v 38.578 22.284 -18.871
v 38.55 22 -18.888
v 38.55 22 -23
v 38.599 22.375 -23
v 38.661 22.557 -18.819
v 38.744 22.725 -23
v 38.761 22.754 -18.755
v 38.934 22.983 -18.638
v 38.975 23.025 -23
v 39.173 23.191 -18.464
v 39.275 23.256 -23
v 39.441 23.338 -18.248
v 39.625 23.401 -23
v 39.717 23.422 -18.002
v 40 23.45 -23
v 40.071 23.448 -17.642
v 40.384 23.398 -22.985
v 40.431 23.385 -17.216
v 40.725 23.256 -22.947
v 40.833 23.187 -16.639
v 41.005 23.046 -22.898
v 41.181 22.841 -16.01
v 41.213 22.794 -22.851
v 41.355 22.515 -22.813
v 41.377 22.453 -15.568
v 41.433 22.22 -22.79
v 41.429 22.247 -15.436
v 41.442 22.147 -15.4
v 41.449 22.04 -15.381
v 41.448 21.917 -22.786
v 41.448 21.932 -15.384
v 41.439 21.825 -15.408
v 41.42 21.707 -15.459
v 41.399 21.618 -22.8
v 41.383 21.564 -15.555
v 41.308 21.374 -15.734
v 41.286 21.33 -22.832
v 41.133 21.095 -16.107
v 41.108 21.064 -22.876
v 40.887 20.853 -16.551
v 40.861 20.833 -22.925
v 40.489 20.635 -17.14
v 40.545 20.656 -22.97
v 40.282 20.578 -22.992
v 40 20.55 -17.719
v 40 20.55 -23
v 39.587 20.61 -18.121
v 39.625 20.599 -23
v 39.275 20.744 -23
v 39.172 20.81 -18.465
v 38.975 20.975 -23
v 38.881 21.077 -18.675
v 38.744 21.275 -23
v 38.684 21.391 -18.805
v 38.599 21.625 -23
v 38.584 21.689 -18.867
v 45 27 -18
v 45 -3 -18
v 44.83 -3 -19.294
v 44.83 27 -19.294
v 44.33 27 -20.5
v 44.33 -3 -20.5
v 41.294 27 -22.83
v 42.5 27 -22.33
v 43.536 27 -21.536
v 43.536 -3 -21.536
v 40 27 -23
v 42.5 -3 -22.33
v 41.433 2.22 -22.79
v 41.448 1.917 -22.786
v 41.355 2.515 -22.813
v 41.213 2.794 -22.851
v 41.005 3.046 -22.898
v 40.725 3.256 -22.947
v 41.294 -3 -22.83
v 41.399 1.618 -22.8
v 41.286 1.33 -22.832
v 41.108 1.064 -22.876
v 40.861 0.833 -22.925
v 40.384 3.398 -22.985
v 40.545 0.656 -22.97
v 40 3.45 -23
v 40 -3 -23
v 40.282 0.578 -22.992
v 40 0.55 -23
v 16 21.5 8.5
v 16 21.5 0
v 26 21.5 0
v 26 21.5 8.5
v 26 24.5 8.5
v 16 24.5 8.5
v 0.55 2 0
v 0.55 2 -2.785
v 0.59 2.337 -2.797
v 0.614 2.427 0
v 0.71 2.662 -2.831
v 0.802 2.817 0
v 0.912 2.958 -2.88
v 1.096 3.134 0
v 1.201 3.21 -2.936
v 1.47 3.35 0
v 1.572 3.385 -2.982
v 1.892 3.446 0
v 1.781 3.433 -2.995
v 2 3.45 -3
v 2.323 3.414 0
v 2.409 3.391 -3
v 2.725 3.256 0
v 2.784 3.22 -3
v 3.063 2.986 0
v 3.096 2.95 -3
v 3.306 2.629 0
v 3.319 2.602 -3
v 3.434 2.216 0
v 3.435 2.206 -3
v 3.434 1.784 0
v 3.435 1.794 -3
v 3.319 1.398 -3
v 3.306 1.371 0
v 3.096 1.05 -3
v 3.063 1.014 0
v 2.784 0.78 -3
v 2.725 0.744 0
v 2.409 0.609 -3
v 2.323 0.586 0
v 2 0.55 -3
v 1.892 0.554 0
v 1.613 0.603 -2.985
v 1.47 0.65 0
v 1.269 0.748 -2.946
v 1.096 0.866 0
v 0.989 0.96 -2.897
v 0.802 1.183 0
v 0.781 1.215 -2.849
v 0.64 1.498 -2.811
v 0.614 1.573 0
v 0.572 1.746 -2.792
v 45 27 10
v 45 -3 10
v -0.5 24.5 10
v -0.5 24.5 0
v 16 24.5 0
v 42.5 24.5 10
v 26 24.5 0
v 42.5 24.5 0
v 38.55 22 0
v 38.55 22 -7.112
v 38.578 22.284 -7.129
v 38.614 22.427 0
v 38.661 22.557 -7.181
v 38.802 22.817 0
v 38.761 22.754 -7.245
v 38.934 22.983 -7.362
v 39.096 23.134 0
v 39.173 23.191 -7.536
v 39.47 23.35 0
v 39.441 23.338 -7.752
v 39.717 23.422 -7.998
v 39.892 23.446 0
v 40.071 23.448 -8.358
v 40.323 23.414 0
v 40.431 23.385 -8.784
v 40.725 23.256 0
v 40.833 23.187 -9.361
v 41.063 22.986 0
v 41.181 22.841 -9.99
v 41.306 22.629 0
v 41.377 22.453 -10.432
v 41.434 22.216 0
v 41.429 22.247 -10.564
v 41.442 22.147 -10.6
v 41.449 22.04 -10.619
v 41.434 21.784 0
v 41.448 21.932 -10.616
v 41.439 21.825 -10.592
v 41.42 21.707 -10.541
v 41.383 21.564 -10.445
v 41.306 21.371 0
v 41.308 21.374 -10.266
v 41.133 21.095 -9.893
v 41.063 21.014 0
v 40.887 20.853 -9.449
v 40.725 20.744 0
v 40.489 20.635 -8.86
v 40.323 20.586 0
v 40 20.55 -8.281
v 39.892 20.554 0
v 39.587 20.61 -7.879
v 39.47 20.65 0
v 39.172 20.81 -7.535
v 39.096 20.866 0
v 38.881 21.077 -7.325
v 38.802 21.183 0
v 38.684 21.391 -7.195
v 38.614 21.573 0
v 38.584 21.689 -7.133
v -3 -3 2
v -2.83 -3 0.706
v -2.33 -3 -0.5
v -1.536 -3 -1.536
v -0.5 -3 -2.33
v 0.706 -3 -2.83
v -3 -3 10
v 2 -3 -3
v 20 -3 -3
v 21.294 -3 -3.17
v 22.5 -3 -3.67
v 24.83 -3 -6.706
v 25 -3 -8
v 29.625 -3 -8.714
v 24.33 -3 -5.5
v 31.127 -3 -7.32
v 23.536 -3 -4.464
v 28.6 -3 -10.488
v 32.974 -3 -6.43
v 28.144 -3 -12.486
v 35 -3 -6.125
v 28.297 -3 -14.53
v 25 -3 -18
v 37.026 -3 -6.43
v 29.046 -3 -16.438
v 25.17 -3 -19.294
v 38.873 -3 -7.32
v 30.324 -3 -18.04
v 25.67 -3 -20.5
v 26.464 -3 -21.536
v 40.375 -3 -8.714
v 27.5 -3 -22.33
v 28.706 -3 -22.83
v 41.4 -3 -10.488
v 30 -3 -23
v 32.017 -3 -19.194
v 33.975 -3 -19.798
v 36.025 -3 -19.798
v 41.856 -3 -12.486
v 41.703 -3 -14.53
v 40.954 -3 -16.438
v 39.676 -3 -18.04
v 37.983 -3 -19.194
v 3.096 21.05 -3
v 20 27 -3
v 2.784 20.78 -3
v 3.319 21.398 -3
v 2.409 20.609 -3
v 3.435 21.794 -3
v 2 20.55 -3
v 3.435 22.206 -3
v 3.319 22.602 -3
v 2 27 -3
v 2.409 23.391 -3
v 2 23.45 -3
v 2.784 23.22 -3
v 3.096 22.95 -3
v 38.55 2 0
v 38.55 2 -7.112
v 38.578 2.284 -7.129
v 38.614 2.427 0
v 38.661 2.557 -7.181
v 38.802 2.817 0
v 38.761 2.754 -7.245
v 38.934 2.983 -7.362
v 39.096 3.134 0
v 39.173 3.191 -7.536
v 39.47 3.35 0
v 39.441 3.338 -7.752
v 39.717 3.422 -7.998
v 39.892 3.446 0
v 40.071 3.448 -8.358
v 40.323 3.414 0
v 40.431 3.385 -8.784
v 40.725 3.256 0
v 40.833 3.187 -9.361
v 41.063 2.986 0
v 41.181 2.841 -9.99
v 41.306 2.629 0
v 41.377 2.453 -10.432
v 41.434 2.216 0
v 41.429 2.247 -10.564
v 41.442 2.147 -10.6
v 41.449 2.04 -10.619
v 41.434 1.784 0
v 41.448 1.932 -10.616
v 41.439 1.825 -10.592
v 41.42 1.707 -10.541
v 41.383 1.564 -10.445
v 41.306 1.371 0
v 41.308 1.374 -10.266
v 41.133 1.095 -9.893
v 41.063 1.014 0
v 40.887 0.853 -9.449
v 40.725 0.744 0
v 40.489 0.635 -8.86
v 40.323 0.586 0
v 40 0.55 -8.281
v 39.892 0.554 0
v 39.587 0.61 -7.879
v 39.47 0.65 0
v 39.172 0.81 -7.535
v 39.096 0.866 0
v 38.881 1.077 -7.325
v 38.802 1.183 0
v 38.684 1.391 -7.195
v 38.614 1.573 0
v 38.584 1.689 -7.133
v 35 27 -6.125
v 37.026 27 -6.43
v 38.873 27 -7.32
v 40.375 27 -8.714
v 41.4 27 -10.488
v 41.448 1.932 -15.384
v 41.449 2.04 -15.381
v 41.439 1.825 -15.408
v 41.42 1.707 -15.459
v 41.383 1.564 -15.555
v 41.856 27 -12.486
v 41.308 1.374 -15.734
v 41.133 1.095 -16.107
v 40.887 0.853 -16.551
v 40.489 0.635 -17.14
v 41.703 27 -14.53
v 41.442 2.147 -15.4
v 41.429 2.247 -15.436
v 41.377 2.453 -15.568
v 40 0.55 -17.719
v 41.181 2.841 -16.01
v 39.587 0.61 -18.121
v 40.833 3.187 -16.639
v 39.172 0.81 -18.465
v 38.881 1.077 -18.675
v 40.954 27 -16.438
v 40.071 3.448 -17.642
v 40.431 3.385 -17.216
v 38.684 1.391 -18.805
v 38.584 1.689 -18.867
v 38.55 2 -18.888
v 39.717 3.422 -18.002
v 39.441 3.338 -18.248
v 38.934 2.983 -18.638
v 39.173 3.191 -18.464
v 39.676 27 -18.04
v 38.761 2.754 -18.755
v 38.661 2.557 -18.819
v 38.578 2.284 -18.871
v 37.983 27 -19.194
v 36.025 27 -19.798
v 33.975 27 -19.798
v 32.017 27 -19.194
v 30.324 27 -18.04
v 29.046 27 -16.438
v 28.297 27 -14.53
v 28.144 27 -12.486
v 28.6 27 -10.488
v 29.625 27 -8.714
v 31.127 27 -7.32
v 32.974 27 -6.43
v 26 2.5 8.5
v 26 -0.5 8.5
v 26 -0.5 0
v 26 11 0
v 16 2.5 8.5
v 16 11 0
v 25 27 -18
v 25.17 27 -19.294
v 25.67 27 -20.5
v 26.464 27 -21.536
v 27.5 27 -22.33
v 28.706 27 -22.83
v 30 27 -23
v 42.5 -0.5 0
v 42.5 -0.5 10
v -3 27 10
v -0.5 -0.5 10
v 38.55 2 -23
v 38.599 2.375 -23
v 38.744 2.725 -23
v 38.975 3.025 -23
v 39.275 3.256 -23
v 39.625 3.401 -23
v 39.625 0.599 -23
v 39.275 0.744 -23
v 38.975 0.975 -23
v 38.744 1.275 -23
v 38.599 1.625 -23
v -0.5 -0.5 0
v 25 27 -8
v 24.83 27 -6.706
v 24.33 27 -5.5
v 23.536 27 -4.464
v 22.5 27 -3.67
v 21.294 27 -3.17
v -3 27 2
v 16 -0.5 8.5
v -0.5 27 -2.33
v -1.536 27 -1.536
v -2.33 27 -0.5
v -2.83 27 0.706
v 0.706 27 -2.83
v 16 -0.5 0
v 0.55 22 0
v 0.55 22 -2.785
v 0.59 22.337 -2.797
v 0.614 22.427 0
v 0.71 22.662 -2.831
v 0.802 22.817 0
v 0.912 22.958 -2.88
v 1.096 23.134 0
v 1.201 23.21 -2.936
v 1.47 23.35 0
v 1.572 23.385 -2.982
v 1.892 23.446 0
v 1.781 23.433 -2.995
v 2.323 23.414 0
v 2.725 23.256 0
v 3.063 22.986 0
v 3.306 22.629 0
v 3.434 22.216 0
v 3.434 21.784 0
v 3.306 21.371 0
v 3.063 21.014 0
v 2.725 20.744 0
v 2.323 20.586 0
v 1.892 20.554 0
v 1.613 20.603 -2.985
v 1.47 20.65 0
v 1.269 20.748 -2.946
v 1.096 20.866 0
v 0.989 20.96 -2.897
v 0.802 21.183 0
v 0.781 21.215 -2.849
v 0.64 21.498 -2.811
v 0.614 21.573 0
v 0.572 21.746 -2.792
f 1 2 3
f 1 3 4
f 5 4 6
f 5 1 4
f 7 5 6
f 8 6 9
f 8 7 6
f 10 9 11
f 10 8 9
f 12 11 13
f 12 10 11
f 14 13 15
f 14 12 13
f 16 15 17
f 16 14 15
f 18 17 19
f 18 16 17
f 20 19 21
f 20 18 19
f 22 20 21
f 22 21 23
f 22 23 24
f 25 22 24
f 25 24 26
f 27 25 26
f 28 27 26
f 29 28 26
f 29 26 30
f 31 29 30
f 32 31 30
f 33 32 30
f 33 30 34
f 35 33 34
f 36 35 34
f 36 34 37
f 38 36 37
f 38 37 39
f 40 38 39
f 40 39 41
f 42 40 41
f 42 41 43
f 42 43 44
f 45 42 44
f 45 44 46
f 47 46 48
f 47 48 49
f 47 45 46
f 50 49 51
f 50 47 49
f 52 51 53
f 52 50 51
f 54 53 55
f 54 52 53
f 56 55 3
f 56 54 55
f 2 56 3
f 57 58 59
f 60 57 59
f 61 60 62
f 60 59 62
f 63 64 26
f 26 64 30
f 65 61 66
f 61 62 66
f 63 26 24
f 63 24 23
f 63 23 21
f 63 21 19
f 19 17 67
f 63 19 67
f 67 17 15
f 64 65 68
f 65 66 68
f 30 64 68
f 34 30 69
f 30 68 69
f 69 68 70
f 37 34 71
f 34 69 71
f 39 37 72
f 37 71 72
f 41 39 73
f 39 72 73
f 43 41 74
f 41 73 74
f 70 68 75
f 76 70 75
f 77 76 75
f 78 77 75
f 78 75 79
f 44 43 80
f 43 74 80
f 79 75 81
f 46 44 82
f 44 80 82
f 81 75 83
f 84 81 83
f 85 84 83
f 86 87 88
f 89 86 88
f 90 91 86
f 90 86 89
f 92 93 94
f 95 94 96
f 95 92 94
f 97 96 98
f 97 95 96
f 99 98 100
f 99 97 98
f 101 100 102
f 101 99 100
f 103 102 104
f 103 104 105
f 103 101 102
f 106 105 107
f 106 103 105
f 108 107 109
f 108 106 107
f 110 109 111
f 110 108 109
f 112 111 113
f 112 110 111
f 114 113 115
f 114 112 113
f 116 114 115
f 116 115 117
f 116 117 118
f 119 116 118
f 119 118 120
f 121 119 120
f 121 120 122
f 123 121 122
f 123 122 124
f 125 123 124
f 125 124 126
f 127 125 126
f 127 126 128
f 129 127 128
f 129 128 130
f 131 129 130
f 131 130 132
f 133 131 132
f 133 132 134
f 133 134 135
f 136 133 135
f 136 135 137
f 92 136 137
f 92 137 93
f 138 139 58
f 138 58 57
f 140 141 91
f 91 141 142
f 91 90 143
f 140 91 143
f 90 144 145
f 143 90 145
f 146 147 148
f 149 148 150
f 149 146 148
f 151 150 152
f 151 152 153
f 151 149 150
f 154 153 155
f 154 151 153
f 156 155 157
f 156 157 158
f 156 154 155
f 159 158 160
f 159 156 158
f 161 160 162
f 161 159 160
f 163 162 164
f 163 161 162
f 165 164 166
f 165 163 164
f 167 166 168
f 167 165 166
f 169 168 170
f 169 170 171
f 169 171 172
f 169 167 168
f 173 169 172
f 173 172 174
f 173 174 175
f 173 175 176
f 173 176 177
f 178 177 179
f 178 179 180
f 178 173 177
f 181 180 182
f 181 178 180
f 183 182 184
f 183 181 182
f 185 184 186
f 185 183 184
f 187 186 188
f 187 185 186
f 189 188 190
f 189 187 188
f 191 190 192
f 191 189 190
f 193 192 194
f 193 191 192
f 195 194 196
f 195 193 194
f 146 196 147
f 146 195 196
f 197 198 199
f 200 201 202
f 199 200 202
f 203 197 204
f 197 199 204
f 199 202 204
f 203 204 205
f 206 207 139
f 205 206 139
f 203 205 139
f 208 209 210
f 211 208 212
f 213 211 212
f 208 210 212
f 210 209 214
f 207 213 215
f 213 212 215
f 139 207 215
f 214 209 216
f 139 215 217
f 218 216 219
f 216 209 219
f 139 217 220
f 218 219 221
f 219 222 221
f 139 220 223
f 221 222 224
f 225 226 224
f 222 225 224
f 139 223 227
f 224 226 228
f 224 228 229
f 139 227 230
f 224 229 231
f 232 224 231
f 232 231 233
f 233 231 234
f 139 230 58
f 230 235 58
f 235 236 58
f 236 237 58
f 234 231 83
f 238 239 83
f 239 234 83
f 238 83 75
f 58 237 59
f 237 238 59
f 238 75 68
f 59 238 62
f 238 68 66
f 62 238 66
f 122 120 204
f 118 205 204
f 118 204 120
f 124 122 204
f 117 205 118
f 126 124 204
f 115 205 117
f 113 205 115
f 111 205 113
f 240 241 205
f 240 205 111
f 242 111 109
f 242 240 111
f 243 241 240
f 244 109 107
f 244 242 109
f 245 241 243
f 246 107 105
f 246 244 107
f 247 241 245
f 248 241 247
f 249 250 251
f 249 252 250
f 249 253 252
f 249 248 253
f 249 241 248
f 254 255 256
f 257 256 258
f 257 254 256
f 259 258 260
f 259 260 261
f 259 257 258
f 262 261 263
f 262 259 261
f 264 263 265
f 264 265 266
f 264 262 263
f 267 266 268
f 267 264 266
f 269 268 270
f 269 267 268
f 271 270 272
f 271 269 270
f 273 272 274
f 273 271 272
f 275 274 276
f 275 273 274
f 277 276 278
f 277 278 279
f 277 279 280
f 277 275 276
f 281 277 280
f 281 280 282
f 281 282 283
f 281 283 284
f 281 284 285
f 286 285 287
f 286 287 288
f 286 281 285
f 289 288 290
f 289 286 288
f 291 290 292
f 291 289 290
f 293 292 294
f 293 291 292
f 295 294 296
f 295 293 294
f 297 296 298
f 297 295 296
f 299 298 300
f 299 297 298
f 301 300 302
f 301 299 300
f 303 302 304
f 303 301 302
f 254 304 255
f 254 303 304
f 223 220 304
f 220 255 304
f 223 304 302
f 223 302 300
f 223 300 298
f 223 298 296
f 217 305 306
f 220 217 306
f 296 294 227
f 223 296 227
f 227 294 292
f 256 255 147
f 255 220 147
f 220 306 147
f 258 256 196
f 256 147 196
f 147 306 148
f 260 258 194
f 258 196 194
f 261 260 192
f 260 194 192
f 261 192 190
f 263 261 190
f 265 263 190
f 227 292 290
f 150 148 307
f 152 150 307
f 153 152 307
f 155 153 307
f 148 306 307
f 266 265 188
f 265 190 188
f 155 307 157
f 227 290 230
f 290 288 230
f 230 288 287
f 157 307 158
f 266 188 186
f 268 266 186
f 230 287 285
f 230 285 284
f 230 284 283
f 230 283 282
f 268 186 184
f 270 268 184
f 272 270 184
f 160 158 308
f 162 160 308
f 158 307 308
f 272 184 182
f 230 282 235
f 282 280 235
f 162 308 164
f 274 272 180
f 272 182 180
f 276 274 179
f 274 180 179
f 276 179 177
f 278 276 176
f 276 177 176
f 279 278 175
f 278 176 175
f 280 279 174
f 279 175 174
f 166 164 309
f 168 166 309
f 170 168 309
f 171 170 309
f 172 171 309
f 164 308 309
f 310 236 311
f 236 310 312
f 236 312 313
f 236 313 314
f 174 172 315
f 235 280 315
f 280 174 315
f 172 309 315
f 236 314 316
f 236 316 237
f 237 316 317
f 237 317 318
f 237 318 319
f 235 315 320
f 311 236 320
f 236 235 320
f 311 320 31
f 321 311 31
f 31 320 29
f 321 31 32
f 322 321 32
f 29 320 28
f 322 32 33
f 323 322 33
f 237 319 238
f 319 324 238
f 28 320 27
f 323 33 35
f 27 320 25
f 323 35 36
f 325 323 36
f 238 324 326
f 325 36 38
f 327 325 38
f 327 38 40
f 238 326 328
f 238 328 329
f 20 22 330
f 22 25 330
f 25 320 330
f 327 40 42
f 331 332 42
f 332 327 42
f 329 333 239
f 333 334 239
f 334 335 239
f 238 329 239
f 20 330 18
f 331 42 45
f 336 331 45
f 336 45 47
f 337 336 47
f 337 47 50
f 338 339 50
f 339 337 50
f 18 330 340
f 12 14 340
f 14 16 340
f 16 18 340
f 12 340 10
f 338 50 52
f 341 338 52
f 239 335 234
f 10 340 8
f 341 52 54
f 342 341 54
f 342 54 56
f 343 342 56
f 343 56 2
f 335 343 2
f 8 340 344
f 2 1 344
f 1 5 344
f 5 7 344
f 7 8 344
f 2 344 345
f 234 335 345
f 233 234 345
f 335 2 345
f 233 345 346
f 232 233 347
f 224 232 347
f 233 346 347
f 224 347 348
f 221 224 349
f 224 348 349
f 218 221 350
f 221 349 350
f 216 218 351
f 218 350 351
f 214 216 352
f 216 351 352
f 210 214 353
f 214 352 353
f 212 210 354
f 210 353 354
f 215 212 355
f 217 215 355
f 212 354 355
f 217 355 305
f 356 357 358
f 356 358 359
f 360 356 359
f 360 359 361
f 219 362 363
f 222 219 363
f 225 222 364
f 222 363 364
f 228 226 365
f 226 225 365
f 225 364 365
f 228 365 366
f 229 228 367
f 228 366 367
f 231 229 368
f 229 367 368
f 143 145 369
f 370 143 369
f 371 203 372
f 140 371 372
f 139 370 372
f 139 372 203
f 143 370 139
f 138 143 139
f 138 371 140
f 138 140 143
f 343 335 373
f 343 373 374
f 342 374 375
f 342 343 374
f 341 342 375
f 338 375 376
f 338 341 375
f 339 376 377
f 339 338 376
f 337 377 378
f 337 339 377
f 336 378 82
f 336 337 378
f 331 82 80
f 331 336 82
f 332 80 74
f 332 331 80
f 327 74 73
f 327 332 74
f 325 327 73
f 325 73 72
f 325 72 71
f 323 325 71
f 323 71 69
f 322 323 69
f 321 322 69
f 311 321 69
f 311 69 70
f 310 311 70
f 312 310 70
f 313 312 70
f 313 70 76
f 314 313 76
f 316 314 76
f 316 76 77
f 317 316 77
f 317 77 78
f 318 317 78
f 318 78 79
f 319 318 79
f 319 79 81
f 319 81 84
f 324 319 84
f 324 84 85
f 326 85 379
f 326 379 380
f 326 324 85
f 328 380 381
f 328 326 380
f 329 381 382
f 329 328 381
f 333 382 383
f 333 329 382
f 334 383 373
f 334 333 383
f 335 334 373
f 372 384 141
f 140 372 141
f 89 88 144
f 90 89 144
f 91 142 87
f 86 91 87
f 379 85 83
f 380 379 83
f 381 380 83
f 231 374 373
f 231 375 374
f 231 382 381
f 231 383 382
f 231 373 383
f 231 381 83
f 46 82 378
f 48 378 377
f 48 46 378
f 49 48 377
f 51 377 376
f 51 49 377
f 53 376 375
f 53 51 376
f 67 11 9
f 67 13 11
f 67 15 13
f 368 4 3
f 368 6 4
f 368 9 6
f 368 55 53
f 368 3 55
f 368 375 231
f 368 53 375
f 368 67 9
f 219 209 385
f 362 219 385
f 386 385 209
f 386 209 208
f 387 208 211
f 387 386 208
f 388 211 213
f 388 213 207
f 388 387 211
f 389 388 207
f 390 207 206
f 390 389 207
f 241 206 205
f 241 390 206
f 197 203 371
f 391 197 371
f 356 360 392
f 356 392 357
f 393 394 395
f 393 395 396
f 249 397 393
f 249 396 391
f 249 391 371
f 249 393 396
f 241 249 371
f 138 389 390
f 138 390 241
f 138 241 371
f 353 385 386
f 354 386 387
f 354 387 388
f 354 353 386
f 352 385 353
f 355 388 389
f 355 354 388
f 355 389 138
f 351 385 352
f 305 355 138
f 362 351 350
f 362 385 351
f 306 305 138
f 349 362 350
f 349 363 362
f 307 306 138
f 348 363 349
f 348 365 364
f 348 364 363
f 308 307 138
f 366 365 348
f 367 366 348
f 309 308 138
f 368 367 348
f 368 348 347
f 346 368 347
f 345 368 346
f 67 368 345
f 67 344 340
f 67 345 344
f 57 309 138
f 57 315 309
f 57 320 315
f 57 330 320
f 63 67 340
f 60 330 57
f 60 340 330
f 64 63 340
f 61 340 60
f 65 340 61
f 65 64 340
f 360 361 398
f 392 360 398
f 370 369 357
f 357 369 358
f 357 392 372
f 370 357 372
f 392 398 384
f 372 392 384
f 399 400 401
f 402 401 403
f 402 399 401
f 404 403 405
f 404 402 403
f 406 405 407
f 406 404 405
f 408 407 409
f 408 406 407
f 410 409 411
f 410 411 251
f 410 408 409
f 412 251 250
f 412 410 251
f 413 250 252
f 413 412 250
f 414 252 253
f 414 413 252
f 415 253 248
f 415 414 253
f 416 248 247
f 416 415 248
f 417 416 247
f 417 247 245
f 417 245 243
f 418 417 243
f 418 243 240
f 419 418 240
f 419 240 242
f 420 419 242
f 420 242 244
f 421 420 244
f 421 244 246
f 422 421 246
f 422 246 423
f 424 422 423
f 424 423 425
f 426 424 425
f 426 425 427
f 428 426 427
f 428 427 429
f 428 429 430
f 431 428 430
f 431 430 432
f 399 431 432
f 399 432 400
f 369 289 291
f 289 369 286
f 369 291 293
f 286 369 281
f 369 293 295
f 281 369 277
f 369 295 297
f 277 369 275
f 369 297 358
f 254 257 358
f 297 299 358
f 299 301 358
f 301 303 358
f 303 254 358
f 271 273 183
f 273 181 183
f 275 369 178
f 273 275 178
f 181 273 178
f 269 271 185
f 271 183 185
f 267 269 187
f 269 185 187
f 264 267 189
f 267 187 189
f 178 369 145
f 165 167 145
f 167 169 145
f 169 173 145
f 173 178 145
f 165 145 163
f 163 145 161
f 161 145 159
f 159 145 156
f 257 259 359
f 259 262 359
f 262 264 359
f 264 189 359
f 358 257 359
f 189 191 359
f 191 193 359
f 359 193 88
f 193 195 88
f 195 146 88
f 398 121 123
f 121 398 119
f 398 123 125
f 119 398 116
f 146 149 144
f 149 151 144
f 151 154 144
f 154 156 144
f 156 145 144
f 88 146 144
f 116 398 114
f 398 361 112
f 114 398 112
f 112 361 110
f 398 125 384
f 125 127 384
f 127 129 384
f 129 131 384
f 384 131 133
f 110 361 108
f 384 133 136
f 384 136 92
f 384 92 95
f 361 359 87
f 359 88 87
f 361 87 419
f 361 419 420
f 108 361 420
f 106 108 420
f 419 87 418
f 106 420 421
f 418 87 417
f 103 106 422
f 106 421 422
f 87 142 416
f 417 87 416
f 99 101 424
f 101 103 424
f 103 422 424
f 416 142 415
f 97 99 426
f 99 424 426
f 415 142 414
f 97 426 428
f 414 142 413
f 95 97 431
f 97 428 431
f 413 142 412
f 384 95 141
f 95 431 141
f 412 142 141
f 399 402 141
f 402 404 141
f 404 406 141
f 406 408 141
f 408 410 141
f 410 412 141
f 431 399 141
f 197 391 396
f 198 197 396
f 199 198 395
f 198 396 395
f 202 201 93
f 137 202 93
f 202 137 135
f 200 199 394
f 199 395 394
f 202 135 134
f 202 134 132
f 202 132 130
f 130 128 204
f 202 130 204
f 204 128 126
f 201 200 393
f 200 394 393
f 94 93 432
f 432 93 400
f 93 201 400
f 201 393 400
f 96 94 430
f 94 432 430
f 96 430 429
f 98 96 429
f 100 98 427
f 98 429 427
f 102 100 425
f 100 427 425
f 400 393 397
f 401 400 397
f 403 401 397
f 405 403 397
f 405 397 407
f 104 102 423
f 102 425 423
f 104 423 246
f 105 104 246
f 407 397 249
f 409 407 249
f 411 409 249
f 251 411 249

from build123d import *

# Parameters (mm, degrees)
SKETCH1_W           = 48
SKETCH1_H           = 30
BOSS_EXTRUDE1_DEPTH = 10
SKETCH2_W           = 10
SKETCH2_H           = 3
CUT_EXTRUDE1_DEPTH  = 1.5
SKETCH3_W           = 48
SKETCH3_H           = 30
SKETCH3_R           = 1.45
BOSS_EXTRUDE2_DEPTH = 3
SKETCH4_W           = 20
SKETCH4_H           = 30
SKETCH4_R           = 1.45
BOSS_EXTRUDE3_DEPTH = 20
SKETCH5_R           = 6.875
CUT_EXTRUDE2_DEPTH  = 35
FILLET1_R           = 5
CHAMFER1_SIZE       = 8.5


# Some blends are built 0.0001 mm under size
with BuildPart() as part:
    # Sketch1 → Boss-Extrude1 (new body)
    with BuildSketch(Plane.XY):
        with Locations((21, 12)):
            Rectangle(SKETCH1_W, SKETCH1_H)
        Polygon((-0.5, 24.5), (16, 24.5), (16, 21.5), (26, 21.5), (26, 24.5), (42.5, 24.5), (42.5, -0.5), (26, -0.5), (26, 2.5), (16, 2.5), (16, -0.5), (-0.5, -0.5), align=None, mode=Mode.SUBTRACT)
    extrude(amount=BOSS_EXTRUDE1_DEPTH)

    # Sketch2 → Cut-Extrude1 (cut)
    with BuildSketch(Plane.XY.offset(10)):
        with Locations((21, 1)):
            Rectangle(SKETCH2_W, SKETCH2_H)
        with Locations((21, 23)):
            Rectangle(SKETCH2_W, SKETCH2_H)
    extrude(amount=-CUT_EXTRUDE1_DEPTH, mode=Mode.SUBTRACT)

    # Sketch3 → Boss-Extrude2 (add)
    with BuildSketch(Plane(origin=(0, 0, 0), x_dir=(-1, 0, 0), z_dir=(0, 0, -1))):
        with Locations((-21, 12)):
            Rectangle(SKETCH3_W, SKETCH3_H)
        with Locations((-40, 22)):
            Circle(SKETCH3_R, mode=Mode.SUBTRACT)
        with Locations((-40, 2)):
            Circle(SKETCH3_R, mode=Mode.SUBTRACT)
        with Locations((-2, 22)):
            Circle(SKETCH3_R, mode=Mode.SUBTRACT)
        with Locations((-2, 2)):
            Circle(SKETCH3_R, mode=Mode.SUBTRACT)
    extrude(amount=BOSS_EXTRUDE2_DEPTH)

    # Sketch4 → Boss-Extrude3 (add)
    with BuildSketch(Plane(origin=(0, 0, -3), x_dir=(-1, 0, 0), z_dir=(0, 0, -1))):
        with Locations((-35, 12)):
            Rectangle(SKETCH4_W, SKETCH4_H)
        with Locations((-40, 22)):
            Circle(SKETCH4_R, mode=Mode.SUBTRACT)
        with Locations((-40, 2)):
            Circle(SKETCH4_R, mode=Mode.SUBTRACT)
    extrude(amount=BOSS_EXTRUDE3_DEPTH)

    # Sketch5 → Cut-Extrude2 (cut)
    with BuildSketch(Plane(origin=(0, 27, 0), x_dir=(1, 0, 0), z_dir=(0, 1, 0))):
        with Locations(Location((35, 13, 0), (0, 0, 270))):
            Circle(SKETCH5_R)
    extrude(amount=-CUT_EXTRUDE2_DEPTH, mode=Mode.SUBTRACT)

    # Fillet1
    # the kernel refuses this fillet: 5 mm, written as the material it adds along each edge
    with BuildSketch(Plane(origin=(25, 27, -3), x_dir=(-1, 0, 0), z_dir=(0, -1, 0))) as fillet1_piece_1:
        with BuildLine():
            CenterArc((FILLET1_R, FILLET1_R), FILLET1_R, 180, 90)
            Line((0, FILLET1_R), (0, 0))
            Line((0, 0), (FILLET1_R, 0))
        make_face()
    extrude(amount=30)
    # the kernel refuses this fillet: 5 mm, written as the material it takes off along each edge
    with BuildSketch(Plane(origin=(45, -15.5, -23), x_dir=(0, 0, 1), z_dir=(0, 1, 0)), Plane(origin=(-3, 39.5, -3), x_dir=(0, 0, 1), z_dir=(0, -1, 0))) as fillet1_2_piece_1:
        with BuildLine():
            CenterArc((FILLET1_R, -FILLET1_R), FILLET1_R, 90, 90)
            Line((0, -FILLET1_R), (0, 0))
            Line((0, 0), (FILLET1_R, 0))
        make_face()
    extrude(amount=55, mode=Mode.SUBTRACT)
    with BuildSketch(Plane(origin=(25, 39.5, -23), x_dir=(1, 0, 0), z_dir=(0, -1, 0))) as fillet1_2_piece_2:
        with BuildLine():
            CenterArc((FILLET1_R, FILLET1_R), FILLET1_R, 180, 90)
            Line((0, FILLET1_R), (0, 0))
            Line((0, 0), (FILLET1_R, 0))
        make_face()
    extrude(amount=55, mode=Mode.SUBTRACT)

    # Chamfer1
    chamfer1_edges = [part.edges().sort_by_distance(p)[0] for p in [
        (21, 2.5, 0),
    ]]
    chamfer(chamfer1_edges, length=CHAMFER1_SIZE - 0.0001)  # a hair under: the kernel refuses the full size


solid = part.part
